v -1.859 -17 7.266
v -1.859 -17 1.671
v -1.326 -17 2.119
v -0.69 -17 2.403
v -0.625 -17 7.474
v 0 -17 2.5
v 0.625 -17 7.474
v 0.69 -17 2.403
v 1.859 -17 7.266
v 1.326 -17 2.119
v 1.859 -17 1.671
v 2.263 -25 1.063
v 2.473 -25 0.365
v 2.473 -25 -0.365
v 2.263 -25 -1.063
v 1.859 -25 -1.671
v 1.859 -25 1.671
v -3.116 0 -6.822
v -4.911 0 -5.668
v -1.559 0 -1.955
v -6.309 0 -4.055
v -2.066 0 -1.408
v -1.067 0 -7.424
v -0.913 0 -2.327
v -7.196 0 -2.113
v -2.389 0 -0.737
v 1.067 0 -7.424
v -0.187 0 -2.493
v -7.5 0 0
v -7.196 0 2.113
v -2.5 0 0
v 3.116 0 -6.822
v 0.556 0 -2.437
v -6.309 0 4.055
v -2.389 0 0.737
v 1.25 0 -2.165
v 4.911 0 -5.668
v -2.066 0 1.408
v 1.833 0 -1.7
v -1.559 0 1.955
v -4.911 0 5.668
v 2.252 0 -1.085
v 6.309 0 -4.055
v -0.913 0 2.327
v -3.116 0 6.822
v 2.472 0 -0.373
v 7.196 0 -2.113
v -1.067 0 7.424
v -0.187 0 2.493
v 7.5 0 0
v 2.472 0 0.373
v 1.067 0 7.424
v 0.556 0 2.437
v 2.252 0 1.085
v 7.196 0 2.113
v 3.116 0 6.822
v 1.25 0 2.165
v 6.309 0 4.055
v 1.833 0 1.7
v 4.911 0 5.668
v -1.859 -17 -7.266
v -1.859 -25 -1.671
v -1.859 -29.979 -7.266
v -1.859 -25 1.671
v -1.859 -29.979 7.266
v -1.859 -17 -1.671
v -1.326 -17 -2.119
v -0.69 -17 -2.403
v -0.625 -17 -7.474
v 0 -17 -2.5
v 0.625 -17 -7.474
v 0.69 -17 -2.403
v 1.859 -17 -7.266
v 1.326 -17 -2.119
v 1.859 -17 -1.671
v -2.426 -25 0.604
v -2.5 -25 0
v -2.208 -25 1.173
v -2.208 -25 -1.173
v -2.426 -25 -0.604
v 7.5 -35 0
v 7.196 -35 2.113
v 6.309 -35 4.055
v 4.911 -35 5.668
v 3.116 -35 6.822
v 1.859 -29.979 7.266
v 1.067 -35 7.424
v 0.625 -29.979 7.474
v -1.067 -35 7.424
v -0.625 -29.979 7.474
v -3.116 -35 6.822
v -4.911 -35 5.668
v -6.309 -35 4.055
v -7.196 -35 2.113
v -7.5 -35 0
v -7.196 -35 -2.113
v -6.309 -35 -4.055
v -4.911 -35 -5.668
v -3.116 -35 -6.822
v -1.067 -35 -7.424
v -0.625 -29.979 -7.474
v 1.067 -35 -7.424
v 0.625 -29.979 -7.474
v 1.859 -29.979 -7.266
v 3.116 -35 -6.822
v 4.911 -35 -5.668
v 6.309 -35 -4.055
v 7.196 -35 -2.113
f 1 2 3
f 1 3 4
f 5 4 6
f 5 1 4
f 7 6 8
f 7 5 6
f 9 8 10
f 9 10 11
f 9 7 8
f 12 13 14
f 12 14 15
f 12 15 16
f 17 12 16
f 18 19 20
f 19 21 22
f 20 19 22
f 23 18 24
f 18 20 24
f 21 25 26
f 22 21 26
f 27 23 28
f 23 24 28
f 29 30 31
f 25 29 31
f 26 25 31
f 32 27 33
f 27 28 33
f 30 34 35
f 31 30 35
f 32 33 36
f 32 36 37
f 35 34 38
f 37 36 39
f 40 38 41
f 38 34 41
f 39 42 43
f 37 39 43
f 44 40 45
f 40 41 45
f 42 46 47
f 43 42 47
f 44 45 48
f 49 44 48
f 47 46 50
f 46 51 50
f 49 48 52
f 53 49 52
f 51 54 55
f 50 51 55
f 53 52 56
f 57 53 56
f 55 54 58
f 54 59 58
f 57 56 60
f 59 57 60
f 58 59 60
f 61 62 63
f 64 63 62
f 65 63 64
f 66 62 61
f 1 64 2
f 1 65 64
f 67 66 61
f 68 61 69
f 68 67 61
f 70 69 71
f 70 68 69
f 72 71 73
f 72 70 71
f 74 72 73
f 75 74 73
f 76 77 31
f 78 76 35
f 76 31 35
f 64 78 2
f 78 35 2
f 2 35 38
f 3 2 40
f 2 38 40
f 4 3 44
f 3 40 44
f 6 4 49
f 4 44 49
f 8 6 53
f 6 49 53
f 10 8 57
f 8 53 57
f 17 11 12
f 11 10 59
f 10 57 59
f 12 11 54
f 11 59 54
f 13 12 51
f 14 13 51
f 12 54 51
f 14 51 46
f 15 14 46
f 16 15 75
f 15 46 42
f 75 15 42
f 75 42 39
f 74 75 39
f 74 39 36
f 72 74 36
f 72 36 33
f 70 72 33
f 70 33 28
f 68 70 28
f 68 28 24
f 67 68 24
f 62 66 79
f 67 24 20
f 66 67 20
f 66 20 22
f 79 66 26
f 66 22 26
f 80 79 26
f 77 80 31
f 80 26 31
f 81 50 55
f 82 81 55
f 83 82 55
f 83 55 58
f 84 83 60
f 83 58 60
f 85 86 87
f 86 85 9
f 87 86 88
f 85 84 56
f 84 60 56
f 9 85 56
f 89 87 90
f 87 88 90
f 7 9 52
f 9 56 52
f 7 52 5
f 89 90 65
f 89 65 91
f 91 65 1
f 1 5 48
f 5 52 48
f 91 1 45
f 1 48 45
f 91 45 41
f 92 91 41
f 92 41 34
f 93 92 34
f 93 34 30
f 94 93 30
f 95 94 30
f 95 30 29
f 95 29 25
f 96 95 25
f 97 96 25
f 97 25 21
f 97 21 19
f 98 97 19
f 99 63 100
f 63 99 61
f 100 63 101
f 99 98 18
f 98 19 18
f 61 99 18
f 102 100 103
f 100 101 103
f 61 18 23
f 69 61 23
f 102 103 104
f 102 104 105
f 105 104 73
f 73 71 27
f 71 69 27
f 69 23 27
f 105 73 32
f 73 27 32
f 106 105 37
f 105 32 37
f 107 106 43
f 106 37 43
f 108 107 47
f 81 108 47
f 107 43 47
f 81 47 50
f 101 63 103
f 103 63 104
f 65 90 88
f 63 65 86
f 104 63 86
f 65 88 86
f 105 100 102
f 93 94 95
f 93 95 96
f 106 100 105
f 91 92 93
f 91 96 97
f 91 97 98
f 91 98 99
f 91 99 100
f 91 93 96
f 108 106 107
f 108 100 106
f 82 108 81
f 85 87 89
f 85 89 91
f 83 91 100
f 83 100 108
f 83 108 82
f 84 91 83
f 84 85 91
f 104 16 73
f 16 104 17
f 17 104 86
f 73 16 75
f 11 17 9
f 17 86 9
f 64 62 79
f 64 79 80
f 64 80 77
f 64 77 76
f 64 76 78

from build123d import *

# Parameters (mm, degrees)
F0_R     = 7.5
F1_DEPTH = 35
F2_W     = 3.71815
F2_H     = 12.979131
F3_DEPTH = 12.5
F4_R     = 2.5
F5_DEPTH = 25


with BuildPart() as f1:
    # F0 (on Front) → F1 (new body)
    with BuildSketch(Plane.XZ):
        Circle(F0_R)
    extrude(amount=F1_DEPTH)

    # F2 (on Top) → F3 (cut, symmetric)
    with BuildSketch(Plane.XY):
        with Locations((0, -23.489568)):
            Rectangle(F2_W, F2_H)
    extrude(amount=F3_DEPTH, both=True, mode=Mode.SUBTRACT)

    # F4 (on face) → F5 (cut)
    with BuildSketch(Plane(origin=(0, 0, 0), x_dir=(-1, 0, 0), z_dir=(0, 1, 0))):
        Circle(F4_R)
    extrude(amount=-F5_DEPTH, mode=Mode.SUBTRACT)


solid = f1.part
